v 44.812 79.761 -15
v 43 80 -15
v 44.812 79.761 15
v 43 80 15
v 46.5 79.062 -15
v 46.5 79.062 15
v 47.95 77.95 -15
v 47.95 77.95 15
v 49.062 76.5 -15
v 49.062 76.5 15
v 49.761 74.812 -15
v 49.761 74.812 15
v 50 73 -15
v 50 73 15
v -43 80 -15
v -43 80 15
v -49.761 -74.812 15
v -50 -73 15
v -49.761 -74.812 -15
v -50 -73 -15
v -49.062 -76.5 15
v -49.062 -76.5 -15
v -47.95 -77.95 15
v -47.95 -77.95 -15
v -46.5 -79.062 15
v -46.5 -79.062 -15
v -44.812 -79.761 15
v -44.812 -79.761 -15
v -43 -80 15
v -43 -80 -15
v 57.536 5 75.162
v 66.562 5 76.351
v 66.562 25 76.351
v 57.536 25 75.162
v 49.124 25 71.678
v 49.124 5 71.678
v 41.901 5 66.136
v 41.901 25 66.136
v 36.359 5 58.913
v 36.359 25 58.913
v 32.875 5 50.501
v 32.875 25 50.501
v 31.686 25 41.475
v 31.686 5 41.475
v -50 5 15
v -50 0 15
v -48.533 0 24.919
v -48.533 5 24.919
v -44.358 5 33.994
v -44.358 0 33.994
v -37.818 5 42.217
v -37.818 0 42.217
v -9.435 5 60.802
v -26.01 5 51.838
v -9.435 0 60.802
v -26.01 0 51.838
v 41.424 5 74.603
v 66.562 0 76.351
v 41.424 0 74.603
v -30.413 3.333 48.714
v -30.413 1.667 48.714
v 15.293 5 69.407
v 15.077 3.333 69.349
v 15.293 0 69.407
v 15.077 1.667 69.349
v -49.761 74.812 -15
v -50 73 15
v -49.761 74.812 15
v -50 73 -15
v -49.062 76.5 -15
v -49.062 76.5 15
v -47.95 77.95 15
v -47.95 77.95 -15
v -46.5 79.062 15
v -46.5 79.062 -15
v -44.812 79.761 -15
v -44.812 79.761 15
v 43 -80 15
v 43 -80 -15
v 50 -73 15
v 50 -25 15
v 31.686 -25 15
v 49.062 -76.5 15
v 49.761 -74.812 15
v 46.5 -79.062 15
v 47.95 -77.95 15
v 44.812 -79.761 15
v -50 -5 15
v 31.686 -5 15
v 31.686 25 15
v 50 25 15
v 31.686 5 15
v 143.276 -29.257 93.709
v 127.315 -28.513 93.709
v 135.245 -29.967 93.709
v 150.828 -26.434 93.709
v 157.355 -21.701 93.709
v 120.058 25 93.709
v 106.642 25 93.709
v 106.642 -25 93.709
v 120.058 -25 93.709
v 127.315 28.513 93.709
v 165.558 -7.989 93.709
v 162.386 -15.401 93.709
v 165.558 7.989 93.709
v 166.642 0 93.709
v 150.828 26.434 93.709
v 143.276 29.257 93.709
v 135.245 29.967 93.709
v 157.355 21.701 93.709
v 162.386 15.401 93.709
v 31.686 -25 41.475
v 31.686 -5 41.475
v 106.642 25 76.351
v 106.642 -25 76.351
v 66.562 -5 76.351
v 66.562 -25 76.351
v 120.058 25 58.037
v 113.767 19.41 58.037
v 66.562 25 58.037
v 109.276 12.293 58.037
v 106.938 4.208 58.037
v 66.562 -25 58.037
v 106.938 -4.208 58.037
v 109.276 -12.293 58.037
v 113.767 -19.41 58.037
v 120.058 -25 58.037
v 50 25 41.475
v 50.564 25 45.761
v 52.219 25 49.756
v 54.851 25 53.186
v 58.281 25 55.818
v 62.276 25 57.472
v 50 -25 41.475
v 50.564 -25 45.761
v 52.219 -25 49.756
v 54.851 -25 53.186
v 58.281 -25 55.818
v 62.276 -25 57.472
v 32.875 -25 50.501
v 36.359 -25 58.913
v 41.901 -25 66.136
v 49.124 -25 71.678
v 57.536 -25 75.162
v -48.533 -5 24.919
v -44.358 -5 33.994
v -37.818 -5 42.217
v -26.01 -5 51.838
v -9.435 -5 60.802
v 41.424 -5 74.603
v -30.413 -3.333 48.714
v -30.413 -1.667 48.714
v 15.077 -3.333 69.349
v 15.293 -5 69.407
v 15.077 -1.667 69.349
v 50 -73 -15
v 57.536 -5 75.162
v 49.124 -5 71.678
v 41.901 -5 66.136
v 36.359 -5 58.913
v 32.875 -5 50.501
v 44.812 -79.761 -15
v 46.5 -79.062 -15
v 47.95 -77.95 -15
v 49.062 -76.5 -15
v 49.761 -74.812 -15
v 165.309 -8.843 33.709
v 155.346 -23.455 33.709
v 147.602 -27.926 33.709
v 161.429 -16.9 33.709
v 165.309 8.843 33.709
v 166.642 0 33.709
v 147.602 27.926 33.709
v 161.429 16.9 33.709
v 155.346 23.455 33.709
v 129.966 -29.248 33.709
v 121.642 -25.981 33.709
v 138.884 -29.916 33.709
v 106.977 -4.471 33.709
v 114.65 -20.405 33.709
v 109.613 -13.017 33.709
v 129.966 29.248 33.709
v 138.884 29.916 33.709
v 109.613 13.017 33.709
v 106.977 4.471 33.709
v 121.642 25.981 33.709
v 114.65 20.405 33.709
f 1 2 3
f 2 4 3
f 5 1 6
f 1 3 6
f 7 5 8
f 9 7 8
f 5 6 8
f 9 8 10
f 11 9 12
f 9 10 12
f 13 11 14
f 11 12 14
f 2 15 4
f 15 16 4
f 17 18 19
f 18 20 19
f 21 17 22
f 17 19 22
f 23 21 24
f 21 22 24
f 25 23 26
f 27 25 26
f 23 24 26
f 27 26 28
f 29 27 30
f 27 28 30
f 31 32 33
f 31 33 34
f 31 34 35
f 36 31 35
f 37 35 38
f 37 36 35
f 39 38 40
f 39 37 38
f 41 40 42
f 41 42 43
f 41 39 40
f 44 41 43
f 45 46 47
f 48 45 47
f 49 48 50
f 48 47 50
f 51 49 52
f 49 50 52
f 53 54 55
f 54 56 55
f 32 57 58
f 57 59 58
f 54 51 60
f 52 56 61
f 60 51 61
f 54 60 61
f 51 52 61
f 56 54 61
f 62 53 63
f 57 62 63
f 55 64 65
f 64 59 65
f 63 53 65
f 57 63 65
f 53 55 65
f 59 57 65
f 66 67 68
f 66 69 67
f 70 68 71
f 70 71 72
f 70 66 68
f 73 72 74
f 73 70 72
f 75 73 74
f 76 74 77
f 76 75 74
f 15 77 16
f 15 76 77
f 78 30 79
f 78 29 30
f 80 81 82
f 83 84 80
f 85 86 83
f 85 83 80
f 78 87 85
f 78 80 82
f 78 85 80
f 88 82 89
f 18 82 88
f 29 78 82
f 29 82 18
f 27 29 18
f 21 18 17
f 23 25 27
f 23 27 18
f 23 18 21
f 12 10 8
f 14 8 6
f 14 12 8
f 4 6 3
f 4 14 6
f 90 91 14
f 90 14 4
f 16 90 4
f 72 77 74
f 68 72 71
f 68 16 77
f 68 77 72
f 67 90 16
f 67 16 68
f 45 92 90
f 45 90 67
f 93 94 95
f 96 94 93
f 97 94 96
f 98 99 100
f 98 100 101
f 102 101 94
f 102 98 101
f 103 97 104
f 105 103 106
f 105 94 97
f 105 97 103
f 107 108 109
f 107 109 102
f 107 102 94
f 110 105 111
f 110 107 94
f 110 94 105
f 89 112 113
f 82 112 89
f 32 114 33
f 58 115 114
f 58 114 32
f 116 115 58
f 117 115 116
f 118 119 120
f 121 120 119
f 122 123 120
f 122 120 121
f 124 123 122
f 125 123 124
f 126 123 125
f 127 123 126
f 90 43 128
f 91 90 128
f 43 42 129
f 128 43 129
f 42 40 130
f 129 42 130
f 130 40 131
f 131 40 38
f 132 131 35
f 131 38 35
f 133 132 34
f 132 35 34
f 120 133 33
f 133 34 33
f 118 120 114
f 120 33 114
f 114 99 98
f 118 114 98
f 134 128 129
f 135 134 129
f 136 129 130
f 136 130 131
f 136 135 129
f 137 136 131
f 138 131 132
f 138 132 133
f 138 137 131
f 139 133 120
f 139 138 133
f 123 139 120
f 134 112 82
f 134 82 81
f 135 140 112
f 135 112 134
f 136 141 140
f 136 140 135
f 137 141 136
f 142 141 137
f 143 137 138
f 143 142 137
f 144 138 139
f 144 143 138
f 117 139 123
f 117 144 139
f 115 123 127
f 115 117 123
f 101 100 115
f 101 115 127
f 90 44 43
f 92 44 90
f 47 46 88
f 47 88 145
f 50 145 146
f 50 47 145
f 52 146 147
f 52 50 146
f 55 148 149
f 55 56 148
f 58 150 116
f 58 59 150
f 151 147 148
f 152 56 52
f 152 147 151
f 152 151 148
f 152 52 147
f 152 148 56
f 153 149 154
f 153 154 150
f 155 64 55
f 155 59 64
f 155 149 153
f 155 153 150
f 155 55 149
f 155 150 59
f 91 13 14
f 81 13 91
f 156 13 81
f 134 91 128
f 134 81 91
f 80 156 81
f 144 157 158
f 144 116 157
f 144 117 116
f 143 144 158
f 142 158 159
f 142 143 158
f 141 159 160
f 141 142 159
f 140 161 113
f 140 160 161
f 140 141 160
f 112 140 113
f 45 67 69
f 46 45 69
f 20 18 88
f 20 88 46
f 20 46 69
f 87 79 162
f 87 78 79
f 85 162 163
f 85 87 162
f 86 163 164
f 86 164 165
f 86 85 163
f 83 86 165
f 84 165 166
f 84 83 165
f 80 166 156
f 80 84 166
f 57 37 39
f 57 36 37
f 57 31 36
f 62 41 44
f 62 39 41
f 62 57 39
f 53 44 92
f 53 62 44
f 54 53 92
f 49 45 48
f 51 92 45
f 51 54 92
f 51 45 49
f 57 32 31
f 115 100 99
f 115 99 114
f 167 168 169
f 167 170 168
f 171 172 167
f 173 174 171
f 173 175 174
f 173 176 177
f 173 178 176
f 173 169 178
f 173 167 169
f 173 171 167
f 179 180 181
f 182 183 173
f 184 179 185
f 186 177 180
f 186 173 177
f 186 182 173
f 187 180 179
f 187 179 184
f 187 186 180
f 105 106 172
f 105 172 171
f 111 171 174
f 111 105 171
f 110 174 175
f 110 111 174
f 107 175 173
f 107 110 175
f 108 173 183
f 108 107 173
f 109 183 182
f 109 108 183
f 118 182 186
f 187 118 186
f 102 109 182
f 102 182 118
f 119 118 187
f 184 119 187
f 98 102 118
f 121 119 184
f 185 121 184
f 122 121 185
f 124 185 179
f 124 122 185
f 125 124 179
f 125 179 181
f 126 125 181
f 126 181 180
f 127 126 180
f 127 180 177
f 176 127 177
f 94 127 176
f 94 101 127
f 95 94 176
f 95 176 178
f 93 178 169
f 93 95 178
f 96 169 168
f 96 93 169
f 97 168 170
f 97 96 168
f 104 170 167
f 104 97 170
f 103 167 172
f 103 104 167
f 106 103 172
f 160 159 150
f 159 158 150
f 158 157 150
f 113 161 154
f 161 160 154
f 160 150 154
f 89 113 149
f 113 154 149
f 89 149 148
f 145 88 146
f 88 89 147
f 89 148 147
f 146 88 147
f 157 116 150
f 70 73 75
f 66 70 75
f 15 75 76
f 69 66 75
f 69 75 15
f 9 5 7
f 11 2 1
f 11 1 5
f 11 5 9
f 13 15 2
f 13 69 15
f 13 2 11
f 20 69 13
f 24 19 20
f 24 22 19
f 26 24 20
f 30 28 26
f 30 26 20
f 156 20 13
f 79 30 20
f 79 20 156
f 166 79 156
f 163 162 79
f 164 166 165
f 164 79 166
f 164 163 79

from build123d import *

# Parameters (mm, degrees)
F1_DEPTH = 80
F2_DEPTH = 25
F3_DEPTH = 5
F4_DEPTH = 25
F6_R     = 7


with BuildPart() as f1:
    # F0 (on Front) → F1 (new body, symmetric)
    with BuildSketch(Plane.XZ):
        Polygon((31.686229, 15), (-50, 15), (-50, -15), (50, -15), (50, 15), align=None)
    extrude(amount=F1_DEPTH, both=True)

    # F0 (on Front) → F2 (join, symmetric)
    with BuildSketch(Plane.XZ):
        with BuildLine():
            Line((31.686229, 41.474519), (31.686229, 15))
            Line((31.686229, 15), (50, 15))
            Line((50, 15), (50, 41.474519))
            ThreePointArc((50, 41.474519), (54.850968, 53.185792), (66.562242, 58.03676))
            Line((66.562242, 58.03676), (106.641613, 58.03676))
            Line((106.641613, 58.03676), (106.641613, 76.350532))
            Line((106.641613, 76.350532), (66.562242, 76.350532))
            ThreePointArc((66.562242, 76.350532), (41.901176, 66.135584), (31.686229, 41.474519))
        make_face()
    extrude(amount=F2_DEPTH, both=True)

    # F0 (on Front) → F3 (join, symmetric)
    with BuildSketch(Plane.XZ):
        with BuildLine():
            add(Edge.make_bspline(
                [(-50, 15), (-50, 55.069078), (18.715411, 76.350532), (66.562242, 76.350532)],
                knots=[0, 0, 0, 0, 131.721843, 131.721843, 131.721843, 131.721843], degree=3))
            Line((-50, 15), (31.686229, 15))
            Line((31.686229, 15), (31.686229, 41.474519))
            ThreePointArc((31.686229, 41.474519), (41.901176, 66.135584), (66.562242, 76.350532))
        make_face()
    extrude(amount=F3_DEPTH, both=True)

    # F0 (on Front) → F4 (join, symmetric)
    with BuildSketch(Plane.XZ):
        Polygon((106.641613, 93.709281), (106.641613, 76.350532), (106.641613, 58.03676), (136.641613, 58.03676), (136.641613, 63.709281), (136.641613, 93.709281), align=None)
    extrude(amount=F4_DEPTH, both=True)

    # F0 (on Front) → F5 (revolve)
    with BuildSketch(Plane.XZ):
        Polygon((166.641613, 93.709281), (136.641613, 93.709281), (136.641613, 63.709281), (136.641613, 58.03676), (136.641613, 33.709281), (166.641613, 33.709281), align=None)
    revolve(axis=Axis((136.641613, 0, 78.709281), (0, 0, 1)))

    # F6
    f6_edges = [f1.edges().sort_by_distance(p)[0] for p in [
        (50, -80, 0),
        (-50, -80, 0),
        (50, 80, 0),
        (-50, 80, 0),
    ]]
    fillet(f6_edges, radius=F6_R)


solid = f1.part
